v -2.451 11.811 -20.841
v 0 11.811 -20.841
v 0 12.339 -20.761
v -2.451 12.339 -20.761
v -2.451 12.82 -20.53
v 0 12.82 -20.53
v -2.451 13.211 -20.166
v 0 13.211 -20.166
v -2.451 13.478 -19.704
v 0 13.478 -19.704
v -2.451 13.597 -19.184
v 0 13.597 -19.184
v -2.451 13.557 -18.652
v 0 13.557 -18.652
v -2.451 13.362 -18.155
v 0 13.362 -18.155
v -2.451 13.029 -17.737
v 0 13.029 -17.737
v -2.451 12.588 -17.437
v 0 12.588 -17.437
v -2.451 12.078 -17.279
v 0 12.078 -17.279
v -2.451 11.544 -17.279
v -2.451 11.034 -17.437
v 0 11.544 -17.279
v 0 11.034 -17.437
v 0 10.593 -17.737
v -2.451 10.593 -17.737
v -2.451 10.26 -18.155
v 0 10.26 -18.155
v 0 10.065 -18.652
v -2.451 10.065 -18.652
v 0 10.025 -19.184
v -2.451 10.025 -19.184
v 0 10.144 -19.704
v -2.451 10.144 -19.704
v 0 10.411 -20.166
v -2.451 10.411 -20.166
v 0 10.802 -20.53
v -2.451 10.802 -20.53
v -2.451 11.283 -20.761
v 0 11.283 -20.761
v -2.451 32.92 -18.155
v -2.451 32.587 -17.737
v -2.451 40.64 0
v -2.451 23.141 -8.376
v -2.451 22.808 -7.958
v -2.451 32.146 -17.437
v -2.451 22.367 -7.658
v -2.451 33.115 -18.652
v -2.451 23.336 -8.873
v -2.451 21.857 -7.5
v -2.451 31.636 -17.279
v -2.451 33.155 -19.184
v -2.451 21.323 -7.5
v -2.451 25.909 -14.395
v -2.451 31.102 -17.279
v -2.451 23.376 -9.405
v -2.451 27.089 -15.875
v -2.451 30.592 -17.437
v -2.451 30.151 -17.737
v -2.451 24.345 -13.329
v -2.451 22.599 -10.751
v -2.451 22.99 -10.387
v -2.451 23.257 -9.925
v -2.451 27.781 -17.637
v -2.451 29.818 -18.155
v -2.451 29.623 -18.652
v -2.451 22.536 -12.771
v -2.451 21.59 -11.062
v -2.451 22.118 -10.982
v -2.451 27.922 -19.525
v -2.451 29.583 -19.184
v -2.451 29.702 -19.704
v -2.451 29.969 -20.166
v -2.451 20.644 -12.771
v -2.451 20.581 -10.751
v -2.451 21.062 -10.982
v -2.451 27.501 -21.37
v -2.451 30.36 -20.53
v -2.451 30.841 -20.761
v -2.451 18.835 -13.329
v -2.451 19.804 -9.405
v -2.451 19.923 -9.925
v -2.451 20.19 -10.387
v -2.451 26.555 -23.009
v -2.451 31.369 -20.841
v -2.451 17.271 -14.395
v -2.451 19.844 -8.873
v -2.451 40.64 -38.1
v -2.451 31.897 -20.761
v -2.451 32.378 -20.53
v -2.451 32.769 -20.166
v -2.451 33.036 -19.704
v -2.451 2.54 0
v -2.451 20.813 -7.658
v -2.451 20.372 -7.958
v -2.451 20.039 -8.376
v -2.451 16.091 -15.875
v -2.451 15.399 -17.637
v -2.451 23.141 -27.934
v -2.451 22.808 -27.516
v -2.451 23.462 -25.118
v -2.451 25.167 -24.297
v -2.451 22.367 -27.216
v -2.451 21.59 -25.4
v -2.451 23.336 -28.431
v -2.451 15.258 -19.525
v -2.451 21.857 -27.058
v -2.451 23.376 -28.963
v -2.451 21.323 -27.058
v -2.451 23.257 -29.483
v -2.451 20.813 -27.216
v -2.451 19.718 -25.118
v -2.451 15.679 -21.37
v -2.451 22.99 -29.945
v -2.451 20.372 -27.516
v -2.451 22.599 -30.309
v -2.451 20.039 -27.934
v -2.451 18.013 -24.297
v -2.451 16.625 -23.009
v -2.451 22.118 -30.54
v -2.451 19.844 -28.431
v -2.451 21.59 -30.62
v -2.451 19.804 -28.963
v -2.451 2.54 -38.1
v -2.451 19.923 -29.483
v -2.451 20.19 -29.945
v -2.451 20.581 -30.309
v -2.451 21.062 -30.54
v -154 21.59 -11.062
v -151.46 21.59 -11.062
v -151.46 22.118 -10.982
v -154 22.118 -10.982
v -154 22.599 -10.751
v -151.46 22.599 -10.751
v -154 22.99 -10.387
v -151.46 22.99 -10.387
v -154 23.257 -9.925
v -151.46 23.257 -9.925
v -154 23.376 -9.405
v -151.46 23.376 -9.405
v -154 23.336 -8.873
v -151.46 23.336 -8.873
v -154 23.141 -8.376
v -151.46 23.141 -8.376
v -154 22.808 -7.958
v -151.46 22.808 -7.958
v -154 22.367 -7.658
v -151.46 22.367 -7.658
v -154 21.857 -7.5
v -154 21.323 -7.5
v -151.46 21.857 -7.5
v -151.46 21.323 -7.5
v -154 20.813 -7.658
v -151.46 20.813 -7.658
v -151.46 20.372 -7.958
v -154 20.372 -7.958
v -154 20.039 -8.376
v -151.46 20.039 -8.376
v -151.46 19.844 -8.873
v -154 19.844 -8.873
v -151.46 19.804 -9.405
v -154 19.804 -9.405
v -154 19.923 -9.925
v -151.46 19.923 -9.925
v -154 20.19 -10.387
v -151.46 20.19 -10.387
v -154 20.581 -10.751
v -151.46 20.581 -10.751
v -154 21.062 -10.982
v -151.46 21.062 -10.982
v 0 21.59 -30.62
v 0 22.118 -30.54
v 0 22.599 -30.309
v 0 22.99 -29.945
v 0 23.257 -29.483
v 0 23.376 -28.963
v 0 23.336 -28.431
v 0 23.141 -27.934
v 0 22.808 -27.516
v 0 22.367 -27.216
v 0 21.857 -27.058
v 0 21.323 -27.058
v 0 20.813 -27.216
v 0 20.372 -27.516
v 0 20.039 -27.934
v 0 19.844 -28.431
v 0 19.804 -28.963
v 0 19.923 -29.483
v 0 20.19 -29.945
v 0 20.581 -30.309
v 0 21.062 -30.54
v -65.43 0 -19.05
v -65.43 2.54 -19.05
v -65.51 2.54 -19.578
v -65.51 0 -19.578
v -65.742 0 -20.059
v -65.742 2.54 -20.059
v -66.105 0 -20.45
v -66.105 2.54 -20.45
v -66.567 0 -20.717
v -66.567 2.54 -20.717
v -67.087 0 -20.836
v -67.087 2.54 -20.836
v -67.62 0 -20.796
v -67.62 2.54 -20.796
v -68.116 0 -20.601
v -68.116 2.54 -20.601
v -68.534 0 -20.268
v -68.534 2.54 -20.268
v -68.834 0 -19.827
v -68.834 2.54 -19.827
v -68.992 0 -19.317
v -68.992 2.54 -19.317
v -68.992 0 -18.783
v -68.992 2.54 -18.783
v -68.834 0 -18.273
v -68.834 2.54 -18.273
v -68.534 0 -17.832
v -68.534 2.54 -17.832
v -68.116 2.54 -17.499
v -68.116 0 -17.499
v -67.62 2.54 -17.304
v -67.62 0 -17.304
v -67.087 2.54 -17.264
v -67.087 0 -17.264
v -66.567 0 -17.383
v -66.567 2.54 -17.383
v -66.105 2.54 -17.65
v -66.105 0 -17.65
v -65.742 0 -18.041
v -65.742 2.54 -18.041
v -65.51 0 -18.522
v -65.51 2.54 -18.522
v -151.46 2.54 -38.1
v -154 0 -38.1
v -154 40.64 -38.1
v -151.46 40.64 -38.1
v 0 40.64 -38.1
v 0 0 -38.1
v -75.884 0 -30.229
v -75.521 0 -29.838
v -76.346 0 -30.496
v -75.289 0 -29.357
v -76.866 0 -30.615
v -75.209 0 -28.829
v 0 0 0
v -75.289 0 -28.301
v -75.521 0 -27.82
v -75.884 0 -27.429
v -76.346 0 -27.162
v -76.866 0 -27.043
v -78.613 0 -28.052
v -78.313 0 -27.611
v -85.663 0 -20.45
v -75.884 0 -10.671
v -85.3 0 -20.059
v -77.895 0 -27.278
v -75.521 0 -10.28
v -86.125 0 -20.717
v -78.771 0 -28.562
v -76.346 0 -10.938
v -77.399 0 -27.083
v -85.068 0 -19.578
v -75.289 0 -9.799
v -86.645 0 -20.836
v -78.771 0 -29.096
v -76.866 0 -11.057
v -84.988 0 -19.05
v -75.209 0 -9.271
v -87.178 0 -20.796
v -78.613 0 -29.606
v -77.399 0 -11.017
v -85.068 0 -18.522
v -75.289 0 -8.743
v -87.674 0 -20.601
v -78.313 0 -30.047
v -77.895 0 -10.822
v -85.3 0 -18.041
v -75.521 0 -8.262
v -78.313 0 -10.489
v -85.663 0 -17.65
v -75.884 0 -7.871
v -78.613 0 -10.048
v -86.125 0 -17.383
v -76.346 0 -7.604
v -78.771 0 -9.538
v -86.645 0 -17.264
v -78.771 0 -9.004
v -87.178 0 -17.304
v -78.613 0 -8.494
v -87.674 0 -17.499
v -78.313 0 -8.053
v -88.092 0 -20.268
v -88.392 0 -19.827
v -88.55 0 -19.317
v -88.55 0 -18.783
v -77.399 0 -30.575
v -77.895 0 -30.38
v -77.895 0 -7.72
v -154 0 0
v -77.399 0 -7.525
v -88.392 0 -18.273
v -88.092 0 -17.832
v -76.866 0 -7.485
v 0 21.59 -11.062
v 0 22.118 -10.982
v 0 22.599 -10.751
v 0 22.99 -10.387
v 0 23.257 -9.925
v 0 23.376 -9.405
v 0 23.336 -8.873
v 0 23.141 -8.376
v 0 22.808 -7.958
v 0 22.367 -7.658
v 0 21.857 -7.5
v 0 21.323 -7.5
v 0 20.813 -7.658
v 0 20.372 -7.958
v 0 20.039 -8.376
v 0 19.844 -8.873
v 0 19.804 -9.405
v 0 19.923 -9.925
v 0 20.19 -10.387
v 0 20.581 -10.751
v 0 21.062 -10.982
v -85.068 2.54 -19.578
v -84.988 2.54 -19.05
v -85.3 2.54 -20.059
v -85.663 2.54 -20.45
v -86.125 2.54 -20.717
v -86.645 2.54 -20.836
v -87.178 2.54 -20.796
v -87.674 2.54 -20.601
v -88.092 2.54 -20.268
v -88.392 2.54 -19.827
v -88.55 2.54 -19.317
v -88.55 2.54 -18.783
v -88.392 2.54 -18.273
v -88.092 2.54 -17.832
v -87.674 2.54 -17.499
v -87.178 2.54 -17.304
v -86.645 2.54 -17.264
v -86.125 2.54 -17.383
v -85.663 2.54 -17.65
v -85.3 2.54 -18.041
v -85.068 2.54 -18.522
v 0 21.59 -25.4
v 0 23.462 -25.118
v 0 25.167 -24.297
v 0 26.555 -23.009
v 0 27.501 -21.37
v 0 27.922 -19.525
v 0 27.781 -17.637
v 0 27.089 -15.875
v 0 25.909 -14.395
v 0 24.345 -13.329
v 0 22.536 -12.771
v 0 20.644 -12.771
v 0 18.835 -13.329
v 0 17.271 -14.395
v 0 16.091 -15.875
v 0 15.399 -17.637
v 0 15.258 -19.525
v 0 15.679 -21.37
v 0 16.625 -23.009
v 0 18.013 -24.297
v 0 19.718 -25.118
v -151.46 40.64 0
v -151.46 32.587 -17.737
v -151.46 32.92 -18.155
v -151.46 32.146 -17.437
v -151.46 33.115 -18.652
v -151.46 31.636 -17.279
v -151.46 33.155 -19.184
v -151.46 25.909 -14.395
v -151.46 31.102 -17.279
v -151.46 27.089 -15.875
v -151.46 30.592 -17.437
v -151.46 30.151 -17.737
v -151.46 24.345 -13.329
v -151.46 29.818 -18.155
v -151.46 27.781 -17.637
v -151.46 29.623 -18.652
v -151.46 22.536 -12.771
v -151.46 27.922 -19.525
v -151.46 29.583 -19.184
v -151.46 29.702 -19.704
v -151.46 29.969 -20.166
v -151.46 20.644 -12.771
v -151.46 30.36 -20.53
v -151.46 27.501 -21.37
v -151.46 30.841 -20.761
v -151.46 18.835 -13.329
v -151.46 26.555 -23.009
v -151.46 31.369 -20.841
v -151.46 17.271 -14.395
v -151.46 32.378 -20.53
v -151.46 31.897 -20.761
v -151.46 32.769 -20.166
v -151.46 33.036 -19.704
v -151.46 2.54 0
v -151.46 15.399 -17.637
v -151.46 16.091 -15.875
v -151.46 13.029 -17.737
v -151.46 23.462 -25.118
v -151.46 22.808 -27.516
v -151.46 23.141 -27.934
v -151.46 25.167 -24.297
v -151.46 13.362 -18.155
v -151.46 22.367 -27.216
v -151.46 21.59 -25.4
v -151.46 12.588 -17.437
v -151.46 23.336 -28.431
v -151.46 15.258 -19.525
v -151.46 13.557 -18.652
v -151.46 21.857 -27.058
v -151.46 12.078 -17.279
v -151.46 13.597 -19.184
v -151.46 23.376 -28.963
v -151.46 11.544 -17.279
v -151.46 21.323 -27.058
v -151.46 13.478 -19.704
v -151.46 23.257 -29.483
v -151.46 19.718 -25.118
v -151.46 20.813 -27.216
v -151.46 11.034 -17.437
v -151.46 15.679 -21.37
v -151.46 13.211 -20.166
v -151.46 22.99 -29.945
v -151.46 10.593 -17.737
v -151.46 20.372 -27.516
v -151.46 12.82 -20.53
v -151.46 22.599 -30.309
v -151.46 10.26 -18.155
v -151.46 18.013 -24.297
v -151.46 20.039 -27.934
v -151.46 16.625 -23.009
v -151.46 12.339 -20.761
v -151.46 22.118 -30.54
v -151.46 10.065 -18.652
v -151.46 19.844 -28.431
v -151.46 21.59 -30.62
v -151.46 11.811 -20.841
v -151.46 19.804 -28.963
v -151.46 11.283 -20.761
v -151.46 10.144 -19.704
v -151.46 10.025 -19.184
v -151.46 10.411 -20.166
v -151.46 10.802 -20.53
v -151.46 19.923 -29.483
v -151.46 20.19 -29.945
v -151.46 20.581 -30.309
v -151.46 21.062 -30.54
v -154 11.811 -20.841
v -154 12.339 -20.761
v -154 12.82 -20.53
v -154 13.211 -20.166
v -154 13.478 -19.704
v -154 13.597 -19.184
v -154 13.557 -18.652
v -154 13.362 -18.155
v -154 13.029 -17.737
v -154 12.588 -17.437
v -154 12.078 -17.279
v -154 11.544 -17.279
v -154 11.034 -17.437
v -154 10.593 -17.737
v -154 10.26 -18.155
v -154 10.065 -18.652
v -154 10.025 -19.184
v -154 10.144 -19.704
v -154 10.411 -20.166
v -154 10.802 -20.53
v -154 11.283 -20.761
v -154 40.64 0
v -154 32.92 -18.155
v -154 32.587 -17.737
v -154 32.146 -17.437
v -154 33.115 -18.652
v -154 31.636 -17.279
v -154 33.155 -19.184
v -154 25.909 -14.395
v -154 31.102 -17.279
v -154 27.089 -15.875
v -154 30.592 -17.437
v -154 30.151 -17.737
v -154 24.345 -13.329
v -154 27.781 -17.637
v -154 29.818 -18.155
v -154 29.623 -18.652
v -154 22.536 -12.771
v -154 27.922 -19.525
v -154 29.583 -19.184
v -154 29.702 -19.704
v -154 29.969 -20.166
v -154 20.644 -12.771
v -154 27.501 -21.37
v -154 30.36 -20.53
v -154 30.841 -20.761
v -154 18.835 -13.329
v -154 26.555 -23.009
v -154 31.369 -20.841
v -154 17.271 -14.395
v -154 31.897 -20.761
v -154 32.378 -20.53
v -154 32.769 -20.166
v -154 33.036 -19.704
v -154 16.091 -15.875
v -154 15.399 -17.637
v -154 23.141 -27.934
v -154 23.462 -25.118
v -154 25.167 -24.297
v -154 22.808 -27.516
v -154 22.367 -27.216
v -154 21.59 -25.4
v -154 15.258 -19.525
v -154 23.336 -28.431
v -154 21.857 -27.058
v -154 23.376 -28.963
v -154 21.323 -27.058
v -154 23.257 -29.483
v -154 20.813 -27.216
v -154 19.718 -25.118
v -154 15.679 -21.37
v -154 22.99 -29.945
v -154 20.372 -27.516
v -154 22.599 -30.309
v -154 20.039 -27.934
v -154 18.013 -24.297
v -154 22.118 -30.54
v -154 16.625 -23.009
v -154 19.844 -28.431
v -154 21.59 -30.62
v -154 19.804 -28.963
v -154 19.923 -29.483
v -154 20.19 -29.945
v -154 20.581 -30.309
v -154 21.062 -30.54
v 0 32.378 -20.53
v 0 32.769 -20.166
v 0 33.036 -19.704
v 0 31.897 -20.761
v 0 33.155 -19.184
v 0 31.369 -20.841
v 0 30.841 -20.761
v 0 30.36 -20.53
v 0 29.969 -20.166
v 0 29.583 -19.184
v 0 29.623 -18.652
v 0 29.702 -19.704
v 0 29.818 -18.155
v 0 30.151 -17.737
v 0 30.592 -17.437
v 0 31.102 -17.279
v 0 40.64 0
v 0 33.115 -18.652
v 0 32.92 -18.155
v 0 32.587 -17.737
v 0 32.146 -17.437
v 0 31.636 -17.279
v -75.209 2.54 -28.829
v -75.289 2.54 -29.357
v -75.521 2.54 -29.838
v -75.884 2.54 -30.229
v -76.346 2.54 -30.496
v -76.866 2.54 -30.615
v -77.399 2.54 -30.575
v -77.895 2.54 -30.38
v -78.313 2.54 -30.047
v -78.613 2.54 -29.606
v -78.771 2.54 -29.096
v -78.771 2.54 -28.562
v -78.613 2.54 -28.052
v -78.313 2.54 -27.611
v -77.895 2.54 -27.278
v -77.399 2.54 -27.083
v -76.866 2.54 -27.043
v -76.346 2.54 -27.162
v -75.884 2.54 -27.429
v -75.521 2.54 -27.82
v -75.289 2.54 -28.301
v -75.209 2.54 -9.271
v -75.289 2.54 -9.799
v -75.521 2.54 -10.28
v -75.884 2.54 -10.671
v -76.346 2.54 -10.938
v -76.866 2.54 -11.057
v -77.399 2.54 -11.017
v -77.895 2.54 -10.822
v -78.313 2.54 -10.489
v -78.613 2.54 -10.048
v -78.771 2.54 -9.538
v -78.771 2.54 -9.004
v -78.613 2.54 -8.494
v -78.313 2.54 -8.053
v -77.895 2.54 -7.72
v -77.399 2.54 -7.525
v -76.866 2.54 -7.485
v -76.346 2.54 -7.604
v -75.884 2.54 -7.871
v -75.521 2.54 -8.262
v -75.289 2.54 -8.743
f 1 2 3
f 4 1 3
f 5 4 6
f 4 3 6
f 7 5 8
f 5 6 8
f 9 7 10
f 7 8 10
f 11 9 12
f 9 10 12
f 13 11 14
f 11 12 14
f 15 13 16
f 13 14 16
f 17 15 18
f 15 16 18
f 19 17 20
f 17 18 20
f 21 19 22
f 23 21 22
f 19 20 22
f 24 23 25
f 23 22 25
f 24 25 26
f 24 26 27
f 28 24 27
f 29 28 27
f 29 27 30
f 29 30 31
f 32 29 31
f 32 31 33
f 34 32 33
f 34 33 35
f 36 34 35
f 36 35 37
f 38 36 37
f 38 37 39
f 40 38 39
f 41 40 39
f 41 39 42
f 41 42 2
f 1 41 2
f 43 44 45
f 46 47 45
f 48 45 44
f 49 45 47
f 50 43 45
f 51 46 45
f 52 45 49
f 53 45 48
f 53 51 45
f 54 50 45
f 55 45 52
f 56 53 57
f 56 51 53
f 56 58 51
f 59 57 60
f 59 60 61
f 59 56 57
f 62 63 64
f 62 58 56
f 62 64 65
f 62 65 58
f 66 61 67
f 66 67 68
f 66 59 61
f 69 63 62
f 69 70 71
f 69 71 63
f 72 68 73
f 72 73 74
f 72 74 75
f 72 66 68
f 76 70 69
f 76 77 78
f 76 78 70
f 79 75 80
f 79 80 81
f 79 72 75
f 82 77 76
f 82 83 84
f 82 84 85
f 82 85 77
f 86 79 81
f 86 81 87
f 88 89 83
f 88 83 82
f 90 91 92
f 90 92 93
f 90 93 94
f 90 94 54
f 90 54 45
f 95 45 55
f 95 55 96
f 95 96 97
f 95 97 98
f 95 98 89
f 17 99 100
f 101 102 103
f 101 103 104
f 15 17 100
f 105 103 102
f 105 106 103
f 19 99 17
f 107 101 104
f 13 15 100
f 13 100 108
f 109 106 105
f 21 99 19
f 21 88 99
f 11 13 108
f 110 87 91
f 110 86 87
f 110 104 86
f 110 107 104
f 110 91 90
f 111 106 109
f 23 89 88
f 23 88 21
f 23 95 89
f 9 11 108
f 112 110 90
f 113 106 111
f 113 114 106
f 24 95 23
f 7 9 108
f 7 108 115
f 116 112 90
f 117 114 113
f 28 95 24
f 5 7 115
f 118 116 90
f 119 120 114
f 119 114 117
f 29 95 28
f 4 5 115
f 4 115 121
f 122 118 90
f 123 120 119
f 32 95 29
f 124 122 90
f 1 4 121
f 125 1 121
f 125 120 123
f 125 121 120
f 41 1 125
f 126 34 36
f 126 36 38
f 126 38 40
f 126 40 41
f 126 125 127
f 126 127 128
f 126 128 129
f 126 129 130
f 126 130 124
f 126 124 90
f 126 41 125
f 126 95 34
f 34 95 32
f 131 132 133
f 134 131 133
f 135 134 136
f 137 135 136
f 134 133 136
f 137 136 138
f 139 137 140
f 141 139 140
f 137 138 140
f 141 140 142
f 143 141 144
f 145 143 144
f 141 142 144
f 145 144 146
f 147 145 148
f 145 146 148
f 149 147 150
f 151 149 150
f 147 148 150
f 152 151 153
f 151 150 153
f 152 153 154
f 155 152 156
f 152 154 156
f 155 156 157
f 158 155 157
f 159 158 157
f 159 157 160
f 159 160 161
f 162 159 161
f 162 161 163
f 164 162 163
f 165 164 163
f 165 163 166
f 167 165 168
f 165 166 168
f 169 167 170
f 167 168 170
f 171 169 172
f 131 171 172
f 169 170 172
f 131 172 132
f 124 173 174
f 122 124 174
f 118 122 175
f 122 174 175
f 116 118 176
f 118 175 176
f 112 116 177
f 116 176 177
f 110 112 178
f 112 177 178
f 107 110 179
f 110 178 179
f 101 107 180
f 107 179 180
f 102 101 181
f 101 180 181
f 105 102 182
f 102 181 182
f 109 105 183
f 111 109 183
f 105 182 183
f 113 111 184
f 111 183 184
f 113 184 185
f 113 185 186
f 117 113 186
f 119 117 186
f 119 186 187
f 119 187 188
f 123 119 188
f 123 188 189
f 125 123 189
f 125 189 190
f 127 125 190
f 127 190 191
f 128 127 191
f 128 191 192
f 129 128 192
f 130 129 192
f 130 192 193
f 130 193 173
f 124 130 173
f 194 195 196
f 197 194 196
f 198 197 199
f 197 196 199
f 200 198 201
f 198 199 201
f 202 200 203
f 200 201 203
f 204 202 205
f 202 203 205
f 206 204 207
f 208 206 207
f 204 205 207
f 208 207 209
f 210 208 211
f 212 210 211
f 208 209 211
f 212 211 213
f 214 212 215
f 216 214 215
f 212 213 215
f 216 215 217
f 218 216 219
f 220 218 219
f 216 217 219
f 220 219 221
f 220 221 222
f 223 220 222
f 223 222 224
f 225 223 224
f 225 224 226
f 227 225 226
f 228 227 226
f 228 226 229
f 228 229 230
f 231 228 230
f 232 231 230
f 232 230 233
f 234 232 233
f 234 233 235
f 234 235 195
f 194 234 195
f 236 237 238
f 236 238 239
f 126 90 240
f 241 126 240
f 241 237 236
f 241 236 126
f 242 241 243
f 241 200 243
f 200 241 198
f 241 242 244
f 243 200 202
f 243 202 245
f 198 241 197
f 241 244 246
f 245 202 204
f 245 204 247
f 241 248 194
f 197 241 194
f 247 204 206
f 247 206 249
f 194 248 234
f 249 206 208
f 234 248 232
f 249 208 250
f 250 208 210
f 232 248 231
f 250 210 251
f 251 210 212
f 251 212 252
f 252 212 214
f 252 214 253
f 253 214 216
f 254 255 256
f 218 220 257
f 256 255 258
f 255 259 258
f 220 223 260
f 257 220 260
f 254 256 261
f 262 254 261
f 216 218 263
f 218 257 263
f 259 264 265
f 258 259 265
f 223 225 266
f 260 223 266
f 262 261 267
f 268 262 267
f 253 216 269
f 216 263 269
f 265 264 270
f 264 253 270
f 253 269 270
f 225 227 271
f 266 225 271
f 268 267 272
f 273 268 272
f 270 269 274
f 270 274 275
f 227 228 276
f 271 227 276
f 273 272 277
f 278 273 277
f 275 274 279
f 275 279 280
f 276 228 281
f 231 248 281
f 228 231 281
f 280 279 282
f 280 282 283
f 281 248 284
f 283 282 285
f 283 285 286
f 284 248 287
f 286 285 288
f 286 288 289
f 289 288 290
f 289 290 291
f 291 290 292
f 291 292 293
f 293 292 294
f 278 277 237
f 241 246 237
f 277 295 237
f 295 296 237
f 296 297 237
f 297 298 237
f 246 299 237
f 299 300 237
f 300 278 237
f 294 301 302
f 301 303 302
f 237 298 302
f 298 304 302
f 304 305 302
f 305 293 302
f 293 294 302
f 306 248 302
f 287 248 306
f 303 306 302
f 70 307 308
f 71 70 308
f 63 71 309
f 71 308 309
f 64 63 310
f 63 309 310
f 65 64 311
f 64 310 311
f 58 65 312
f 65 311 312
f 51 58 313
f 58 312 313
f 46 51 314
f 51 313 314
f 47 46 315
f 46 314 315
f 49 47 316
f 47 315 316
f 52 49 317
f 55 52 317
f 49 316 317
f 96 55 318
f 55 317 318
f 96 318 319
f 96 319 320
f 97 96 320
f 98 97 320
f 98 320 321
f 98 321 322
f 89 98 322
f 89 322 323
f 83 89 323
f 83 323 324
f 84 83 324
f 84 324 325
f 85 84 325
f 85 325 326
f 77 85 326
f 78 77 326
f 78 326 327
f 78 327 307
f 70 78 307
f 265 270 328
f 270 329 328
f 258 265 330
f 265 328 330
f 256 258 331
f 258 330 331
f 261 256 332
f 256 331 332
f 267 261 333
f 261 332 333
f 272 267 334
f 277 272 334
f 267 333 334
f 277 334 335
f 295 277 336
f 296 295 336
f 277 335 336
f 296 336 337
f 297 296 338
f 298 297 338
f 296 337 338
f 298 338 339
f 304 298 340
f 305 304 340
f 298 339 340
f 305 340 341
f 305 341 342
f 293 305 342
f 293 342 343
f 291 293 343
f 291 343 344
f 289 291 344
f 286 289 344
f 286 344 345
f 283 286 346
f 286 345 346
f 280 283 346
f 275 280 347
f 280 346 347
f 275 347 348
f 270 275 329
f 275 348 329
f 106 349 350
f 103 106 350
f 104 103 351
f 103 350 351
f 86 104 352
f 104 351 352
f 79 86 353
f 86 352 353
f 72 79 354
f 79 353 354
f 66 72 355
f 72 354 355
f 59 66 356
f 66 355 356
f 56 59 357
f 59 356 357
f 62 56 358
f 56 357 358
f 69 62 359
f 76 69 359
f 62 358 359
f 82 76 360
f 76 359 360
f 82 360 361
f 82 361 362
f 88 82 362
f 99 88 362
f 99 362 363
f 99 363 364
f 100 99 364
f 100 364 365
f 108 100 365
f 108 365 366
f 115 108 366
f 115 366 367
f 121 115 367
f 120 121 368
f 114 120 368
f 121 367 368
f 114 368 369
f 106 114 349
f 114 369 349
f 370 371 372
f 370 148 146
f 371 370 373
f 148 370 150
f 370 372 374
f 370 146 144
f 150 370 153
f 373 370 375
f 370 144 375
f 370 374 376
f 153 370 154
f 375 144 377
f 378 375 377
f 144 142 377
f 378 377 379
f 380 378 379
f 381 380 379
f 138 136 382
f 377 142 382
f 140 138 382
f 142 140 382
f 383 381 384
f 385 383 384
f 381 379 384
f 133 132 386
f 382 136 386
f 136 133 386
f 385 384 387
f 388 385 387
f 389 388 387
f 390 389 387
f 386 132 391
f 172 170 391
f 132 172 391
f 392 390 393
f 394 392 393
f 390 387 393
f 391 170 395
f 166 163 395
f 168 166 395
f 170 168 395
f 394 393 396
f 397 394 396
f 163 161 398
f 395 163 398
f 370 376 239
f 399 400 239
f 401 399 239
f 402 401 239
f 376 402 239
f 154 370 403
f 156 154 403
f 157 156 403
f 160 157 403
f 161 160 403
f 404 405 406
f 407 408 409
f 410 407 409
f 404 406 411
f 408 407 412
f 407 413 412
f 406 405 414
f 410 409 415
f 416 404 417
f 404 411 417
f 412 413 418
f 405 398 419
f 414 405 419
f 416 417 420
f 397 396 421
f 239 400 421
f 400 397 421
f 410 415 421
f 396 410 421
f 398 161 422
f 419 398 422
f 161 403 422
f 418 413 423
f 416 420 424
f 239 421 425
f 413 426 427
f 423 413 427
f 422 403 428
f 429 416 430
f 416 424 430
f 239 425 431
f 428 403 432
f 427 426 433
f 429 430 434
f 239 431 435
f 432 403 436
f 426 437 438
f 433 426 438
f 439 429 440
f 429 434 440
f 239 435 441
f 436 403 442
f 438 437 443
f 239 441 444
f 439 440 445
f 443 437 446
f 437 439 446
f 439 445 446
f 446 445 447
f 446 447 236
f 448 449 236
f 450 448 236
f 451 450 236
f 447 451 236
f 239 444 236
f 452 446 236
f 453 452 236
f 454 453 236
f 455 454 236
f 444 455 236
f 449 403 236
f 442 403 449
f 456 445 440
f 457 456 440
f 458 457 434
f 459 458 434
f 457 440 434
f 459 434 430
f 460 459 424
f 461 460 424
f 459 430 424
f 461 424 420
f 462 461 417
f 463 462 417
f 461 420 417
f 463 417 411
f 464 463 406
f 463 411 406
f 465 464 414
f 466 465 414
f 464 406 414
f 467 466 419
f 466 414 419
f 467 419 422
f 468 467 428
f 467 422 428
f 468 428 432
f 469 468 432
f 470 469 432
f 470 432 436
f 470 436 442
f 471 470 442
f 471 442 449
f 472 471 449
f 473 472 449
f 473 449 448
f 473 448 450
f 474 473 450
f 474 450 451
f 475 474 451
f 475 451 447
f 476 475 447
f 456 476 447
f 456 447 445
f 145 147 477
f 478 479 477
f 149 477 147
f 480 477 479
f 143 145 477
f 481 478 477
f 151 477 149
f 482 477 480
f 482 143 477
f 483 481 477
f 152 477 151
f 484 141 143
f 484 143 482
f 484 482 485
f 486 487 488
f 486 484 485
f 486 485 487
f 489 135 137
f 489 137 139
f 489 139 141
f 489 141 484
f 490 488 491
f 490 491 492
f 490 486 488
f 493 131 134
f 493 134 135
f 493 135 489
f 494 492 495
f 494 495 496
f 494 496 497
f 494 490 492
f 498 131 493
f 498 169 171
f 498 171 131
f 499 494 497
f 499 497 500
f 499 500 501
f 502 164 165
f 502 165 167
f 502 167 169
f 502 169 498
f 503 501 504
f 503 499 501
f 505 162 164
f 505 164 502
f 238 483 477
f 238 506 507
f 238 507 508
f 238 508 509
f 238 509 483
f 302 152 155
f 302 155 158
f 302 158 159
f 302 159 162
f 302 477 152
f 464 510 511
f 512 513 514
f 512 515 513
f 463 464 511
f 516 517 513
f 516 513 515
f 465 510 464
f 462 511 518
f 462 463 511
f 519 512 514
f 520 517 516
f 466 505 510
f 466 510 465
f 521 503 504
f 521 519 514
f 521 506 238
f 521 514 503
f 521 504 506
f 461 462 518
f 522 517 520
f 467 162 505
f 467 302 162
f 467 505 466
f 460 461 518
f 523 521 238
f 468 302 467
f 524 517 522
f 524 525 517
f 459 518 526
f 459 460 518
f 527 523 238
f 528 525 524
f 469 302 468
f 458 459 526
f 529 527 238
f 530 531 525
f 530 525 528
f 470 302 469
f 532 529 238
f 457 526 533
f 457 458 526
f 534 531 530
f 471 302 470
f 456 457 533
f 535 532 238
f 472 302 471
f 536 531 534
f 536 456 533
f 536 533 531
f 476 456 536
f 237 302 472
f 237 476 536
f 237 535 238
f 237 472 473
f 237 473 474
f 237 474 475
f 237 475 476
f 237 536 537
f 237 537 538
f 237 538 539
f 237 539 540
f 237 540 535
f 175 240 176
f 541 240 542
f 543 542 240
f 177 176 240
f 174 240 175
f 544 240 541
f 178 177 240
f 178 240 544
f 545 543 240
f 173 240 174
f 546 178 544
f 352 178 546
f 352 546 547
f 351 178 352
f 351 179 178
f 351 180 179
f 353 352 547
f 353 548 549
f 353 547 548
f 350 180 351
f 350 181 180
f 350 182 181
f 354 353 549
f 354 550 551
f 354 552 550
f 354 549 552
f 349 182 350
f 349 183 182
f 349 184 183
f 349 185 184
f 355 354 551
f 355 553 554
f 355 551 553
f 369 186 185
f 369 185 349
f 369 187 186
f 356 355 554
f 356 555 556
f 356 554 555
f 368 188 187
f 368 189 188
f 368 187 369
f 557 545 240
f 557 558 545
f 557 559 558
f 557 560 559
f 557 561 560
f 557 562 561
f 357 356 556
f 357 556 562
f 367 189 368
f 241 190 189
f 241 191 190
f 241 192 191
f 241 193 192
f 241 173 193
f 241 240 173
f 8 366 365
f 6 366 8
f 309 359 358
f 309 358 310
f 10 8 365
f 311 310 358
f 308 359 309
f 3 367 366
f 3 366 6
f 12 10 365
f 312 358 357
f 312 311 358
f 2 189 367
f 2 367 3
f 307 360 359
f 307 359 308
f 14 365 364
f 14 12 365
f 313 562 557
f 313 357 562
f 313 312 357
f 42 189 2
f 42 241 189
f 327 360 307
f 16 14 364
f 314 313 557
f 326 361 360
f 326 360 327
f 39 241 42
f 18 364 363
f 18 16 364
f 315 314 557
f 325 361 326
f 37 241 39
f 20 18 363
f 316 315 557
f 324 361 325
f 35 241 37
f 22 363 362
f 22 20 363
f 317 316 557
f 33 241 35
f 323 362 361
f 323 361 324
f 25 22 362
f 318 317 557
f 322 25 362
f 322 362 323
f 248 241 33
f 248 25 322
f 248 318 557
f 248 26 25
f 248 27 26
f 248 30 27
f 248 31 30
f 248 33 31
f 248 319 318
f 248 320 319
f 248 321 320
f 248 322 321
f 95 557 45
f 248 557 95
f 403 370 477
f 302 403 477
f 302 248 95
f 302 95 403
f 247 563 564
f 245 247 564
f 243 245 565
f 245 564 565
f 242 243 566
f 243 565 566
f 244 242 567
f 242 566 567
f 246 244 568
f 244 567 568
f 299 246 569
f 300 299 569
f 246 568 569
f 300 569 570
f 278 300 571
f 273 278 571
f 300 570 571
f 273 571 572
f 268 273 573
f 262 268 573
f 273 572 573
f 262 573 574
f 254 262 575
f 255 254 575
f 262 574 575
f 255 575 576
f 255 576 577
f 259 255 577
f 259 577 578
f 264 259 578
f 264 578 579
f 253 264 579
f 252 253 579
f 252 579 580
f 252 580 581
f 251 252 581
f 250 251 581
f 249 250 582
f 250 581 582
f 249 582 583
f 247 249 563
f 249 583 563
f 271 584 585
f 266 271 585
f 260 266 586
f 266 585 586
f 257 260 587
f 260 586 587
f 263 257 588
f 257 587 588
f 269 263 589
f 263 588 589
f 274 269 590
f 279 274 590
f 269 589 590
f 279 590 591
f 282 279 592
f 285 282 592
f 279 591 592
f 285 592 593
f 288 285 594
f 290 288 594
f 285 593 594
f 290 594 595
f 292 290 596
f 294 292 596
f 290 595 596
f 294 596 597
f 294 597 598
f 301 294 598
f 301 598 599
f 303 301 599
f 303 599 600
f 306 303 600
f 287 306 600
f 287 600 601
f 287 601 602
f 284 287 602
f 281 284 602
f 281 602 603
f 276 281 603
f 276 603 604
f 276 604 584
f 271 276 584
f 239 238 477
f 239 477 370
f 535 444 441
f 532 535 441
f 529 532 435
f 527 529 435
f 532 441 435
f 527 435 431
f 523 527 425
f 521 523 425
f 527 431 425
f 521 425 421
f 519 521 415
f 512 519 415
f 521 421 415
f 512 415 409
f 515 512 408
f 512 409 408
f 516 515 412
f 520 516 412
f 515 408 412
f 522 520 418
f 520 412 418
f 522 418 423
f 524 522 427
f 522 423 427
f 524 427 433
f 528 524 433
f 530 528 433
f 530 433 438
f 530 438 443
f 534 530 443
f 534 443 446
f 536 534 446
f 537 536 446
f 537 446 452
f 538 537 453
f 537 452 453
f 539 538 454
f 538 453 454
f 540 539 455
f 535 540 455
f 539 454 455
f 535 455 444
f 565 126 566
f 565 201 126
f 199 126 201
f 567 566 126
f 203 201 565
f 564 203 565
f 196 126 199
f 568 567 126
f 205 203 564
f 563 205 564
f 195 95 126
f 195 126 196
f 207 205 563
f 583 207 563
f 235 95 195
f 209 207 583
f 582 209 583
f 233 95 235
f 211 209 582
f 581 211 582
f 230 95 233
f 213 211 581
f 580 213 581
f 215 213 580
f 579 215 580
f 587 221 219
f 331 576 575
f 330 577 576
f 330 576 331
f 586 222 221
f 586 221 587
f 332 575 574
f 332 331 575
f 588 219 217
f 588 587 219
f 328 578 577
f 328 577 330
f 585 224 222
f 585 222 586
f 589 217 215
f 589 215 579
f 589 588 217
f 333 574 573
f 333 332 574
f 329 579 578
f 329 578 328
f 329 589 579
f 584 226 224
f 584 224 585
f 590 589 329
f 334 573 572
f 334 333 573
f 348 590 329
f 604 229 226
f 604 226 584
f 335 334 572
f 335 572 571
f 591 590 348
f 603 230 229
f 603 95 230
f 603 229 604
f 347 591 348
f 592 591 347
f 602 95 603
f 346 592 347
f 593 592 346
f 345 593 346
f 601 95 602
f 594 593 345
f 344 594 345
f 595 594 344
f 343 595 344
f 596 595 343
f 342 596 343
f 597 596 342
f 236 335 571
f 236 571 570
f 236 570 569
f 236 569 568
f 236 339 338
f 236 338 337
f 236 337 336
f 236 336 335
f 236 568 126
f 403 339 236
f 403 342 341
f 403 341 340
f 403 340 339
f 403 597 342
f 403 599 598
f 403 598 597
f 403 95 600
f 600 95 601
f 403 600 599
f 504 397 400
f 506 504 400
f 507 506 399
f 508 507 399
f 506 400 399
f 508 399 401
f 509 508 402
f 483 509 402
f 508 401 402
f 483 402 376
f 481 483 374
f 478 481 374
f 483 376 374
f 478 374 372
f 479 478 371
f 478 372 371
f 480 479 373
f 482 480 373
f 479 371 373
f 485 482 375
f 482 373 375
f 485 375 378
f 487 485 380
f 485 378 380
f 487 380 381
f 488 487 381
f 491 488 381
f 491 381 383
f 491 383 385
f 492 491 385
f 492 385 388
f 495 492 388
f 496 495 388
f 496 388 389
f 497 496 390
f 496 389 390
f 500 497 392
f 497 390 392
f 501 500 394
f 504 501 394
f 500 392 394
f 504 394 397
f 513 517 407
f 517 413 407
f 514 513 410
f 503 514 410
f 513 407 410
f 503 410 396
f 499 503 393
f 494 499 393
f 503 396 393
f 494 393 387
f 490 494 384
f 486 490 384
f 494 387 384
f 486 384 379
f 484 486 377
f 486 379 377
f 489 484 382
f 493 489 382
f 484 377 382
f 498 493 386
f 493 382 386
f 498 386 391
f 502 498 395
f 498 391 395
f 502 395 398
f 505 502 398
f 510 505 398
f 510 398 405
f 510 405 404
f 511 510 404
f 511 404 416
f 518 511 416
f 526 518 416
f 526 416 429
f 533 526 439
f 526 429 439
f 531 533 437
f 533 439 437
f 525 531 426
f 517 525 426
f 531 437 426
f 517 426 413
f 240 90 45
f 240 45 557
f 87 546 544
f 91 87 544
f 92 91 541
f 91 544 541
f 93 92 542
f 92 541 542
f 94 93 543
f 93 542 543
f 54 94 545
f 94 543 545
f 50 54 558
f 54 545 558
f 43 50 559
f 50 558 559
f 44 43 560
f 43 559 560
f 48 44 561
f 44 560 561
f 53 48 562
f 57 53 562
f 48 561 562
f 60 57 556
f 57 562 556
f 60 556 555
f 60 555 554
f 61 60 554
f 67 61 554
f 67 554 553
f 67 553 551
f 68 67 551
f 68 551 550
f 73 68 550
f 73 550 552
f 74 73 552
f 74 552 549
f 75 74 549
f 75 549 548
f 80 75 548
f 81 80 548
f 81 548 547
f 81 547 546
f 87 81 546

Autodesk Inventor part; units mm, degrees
ref_plane "YZ Plane" through (0, 0, 0) normal (1, 0, 0) x (0, 1, 0)
ref_plane "XZ Plane" through (0, 0, 0) normal (0, 1, 0) x (-1, 0, 0)
ref_plane "XY Plane" through (0, 0, 0) normal (0, 0, 1) x (1, 0, 0)
sketch "Sketch1" plane through (0, 0, 0) normal (0, 1, 0) x (-1, 0, 0)
  line L0 (0, 0) -> (154.0002, 0)
  line L1 (154.0002, 0) -> (154.0002, -38.1)
  line L2 (154.0002, -38.1) -> (0, -38.1)
  line L3 (0, -38.1) -> (0, 0)
  dimension "d0" = 154.0002
  dimension "d1" = 38.1
extrude "Extrusion1" add sketch "Sketch1" along normal blind 2.54
sketch "Sketch3" plane through (0, 0, 0) normal (1, 0, 0) x (0, 0, -1)
  circle A0 centre (19.05, 31.369) radius 1.7907
  circle A1 centre (28.829, 21.59) radius 1.7907
  circle A2 centre (19.05, 11.811) radius 1.7907
  circle A3 centre (9.271, 21.59) radius 1.7907
  circle A4 centre (19.05, 21.59) radius 6.35
  point P0 (0, 0)
  dimension "d12" = 12.7
sketch "Sketch4" plane through (0, 2.54, 0) normal (0, 1, 0) x (1, 0, 0)
  line L0 (0, 38.1) -> (-154.0002, 38.1) projected
  line L1 (0, 0) -> (-2.451, 0)
  line L2 (-2.451, 0) -> (-2.451, 38.1)
  line L3 (-2.451, 38.1) -> (0, 38.1)
  line L4 (0, 38.1) -> (0, 0)
  line L5 (-154.0002, 38.1) -> (-154.0002, 0) projected
  line L6 (-154.0002, 0) -> (-151.4602, 0)
  line L7 (-151.4602, 0) -> (-151.4602, 38.1)
  line L8 (-151.4602, 38.1) -> (-154.0002, 38.1)
  line L9 (-154.0002, 38.1) -> (-154.0002, 0)
  point P0 (0, 38.1)
  point P1 (-151.4602, 38.1)
  dimension "d17" = 2.54
extrude "Extrusion3" add sketch "Sketch4" along normal blind 38.1
extrude "Extrusion4" cut sketch "Sketch3" against normal blind 203.2
sketch "Sketch5" plane through (0, 2.54, 0) normal (0, 1, 0) x (1, 0, 0)
  line L0 (0, 20.8407) -> (0, 17.2593) projected
  line L1 (-154.0002, 38.1) -> (-154.0002, 0) projected
  line L2 (-77.0001, 38.1) -> (-77.0001, 0)
  line L3 (-77.0001, 19.05) -> (-154.0002, 19.05)
  circle A0 centre (-77.0001, 19.05) radius 9.779
  circle A1 centre (-86.7791, 19.05) radius 1.7907
  circle A2 centre (-77.0001, 9.271) radius 1.7907
  circle A3 centre (-77.0001, 28.829) radius 1.7907
  circle A4 centre (-67.2211, 19.05) radius 1.7907
  point P0 (0, 0)
  dimension "d18" = 19.558
  dimension "d19" = 3.5814
  dimension "d20" = 3.5814
  dimension "d21" = 3.5814
  dimension "d22" = 3.5814
extrude "Extrusion5" cut sketch "Sketch5" against normal blind 203.2 contours A3 A0 L2 | L2 A0 A3 | A0 A3 L2 | L2 A3 A0 | A1 L3 A0 | A0 L3 A1 | A4 A0 | A0 A4 | A0 A1 L3 | L3 A1 A0 | A2 A0 L2 | L2 A0 A2 | A0 A2 L2 | L2 A2 A0
properties part number "Rotate Brace"
